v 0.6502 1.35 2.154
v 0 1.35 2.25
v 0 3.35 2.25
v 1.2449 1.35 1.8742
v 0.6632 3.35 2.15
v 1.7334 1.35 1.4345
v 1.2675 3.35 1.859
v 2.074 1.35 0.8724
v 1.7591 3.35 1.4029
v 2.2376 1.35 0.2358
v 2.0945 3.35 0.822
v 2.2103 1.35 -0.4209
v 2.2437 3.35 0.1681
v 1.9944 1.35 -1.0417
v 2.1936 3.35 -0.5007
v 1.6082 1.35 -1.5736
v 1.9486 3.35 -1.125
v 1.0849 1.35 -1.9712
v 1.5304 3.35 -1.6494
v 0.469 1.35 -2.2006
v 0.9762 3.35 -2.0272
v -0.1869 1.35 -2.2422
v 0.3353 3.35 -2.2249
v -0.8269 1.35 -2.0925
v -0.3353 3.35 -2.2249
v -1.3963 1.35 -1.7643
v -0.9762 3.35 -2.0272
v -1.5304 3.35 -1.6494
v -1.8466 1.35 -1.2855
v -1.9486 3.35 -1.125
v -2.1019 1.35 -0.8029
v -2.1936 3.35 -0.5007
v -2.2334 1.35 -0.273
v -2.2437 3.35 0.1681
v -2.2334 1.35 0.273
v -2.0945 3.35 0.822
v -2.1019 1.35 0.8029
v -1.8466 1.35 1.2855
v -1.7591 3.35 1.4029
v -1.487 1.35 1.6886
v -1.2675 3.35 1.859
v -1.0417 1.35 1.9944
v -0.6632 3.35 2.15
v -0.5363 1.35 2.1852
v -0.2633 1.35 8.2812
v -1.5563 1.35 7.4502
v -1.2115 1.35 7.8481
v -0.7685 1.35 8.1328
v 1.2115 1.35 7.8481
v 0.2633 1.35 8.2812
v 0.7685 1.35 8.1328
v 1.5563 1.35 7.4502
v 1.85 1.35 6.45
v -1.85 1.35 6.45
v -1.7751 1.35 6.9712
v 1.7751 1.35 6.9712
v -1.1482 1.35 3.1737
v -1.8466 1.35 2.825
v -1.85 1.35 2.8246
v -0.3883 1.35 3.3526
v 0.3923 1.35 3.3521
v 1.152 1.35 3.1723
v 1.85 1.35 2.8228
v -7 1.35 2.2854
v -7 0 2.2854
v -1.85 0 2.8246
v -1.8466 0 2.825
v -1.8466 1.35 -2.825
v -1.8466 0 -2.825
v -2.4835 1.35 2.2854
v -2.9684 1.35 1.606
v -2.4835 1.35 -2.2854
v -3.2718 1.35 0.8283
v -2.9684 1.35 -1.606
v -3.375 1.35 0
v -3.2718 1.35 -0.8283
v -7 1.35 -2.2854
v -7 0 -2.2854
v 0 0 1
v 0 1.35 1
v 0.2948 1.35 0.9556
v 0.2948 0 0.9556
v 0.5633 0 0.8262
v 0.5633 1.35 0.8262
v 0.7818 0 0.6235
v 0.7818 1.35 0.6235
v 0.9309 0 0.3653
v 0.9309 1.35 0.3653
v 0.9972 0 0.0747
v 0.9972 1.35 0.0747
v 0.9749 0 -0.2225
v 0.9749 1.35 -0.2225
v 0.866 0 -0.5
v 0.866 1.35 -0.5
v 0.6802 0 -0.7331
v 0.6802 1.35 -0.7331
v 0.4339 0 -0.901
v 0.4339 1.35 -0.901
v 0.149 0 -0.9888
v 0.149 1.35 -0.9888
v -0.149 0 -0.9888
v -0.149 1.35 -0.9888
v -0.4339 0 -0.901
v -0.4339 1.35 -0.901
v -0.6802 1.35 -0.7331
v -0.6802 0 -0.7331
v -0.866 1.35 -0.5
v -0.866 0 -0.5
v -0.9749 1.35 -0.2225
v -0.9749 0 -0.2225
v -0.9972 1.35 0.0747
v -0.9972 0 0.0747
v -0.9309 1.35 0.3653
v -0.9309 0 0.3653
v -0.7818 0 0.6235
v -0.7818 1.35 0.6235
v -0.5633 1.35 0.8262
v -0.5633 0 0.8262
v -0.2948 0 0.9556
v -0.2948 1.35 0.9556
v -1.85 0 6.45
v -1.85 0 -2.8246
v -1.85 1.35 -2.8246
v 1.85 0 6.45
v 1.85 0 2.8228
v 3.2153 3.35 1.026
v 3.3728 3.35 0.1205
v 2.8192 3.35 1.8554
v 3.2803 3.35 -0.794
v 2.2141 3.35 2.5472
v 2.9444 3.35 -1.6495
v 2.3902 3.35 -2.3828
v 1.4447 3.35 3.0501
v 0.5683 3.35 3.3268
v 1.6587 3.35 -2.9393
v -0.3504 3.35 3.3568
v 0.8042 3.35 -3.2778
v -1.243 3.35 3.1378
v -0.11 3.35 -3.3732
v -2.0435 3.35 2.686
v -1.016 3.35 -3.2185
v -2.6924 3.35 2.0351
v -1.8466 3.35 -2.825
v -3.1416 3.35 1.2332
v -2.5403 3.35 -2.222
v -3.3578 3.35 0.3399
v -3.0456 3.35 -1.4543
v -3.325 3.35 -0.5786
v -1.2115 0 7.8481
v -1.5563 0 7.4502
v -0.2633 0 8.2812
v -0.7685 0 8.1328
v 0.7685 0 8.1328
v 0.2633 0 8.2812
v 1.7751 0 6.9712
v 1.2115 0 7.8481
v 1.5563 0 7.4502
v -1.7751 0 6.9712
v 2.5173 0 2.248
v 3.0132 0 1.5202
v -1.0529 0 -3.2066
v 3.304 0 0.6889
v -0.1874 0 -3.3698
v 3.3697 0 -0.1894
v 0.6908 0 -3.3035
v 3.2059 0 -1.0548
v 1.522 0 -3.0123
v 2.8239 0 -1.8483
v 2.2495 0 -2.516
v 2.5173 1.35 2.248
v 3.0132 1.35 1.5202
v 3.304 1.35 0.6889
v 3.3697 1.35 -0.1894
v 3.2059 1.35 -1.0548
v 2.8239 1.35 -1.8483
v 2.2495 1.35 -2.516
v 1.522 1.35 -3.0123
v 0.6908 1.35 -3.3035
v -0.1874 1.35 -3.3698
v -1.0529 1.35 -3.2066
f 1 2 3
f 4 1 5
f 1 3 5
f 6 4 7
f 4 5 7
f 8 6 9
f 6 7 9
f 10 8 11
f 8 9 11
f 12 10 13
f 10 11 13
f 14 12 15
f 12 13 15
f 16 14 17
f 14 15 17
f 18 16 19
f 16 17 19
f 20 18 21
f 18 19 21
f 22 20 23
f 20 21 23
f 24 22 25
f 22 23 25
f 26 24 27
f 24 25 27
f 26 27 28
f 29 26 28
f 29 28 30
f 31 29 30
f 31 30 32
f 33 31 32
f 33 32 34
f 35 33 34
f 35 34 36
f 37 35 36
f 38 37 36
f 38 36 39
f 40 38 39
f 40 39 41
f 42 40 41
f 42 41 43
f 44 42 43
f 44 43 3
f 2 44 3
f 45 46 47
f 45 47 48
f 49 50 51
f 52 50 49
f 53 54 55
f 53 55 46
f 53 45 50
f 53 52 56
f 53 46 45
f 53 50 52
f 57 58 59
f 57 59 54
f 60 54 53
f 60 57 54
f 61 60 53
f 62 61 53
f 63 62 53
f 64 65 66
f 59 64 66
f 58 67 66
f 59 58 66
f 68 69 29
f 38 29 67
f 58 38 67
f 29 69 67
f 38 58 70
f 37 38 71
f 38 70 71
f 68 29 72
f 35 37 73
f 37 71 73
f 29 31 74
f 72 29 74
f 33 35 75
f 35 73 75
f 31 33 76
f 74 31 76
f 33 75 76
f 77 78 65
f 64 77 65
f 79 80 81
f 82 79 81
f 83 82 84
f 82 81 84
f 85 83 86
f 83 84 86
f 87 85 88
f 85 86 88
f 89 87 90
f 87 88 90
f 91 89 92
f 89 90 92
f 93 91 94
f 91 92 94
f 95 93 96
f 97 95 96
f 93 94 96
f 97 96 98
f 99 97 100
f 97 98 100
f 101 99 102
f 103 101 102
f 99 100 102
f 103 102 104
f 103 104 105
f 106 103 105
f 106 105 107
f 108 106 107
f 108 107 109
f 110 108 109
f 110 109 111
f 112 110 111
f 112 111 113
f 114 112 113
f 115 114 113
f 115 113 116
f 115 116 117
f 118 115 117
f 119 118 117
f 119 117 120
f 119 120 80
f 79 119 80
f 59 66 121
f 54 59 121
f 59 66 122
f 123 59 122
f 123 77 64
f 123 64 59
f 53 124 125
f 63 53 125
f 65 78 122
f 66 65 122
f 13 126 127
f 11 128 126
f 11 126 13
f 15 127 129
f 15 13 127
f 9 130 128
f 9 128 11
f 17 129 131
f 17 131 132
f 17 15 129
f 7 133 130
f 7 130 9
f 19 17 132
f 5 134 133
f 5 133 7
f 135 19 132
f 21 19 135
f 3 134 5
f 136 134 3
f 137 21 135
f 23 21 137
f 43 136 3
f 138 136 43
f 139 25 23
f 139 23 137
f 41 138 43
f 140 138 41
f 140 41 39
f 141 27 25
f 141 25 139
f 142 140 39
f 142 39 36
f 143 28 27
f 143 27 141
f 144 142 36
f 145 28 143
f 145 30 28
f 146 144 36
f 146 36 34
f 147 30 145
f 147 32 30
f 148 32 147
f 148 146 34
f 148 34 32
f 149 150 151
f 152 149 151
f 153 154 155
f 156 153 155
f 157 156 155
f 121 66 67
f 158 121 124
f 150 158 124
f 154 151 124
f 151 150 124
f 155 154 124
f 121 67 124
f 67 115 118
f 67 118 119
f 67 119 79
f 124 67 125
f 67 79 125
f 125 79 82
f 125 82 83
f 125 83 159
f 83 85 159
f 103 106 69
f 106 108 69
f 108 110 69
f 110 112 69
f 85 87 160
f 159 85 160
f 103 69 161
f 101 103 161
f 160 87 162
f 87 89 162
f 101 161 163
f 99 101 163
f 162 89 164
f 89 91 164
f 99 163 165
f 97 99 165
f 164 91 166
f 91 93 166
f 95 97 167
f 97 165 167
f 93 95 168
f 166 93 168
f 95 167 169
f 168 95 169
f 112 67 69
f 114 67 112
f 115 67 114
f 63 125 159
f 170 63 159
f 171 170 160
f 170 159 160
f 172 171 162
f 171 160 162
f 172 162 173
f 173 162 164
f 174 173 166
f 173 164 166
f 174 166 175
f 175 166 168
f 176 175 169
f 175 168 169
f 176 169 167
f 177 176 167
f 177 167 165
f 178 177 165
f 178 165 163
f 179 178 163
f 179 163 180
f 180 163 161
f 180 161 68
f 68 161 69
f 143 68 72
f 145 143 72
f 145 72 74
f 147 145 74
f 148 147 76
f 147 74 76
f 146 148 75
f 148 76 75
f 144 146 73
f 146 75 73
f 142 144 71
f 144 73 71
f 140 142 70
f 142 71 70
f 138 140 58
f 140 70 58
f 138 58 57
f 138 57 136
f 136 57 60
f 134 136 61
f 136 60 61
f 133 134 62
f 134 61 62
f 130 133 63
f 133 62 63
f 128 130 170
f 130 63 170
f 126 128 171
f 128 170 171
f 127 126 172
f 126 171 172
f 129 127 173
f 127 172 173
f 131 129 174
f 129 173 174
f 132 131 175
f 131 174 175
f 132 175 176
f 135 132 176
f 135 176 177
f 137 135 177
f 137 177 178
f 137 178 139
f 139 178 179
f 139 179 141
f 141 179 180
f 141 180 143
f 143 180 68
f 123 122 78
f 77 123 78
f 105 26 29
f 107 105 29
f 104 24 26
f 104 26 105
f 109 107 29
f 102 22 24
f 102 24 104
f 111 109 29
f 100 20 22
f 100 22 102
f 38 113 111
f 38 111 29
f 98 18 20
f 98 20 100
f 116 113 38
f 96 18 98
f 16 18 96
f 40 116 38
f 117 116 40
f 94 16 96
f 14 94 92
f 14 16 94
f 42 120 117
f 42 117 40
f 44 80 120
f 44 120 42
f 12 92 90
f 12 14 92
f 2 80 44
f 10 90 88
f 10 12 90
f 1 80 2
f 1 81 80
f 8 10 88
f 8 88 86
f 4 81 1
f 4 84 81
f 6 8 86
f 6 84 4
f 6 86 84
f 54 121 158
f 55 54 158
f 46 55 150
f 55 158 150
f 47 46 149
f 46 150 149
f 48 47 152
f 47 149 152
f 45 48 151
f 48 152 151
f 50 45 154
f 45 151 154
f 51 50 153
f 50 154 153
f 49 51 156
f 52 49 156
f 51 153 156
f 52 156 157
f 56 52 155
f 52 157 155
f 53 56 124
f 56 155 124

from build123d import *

# Parameters (mm, degrees)
ESTRUSIONE_ESTRUSIONE1_DEPTH   = 1.35
ESTRUSIONE_ESTRUSIONE1_2_DEPTH = 1.35
SCHIZZO2_R                     = 3.375
ESTRUSIONE_ESTRUSIONE2_DEPTH   = 2
SCHIZZO4_R                     = 2.25
TAGLIO_ESTRUSIONE1_DEPTH       = 2
SCHIZZO5_R                     = 1
TAGLIO_ESTRUSIONE2_DEPTH       = 12.040380428


with BuildPart() as part:
    # Schizzo1 → Estrusione-Estrusione1 (new body)
    with BuildSketch(Plane(origin=(0, 0, 0), x_dir=(1, 0, 0), z_dir=(0, 1, 0))):
        Polygon((-1.85, 2.824645909), (-7, 2.285363187), (-7, -2.285363187), (-1.85, -2.824645909), align=None)
    extrude(amount=ESTRUSIONE_ESTRUSIONE1_DEPTH)


with BuildPart() as body_2:
    # Schizzo1 → Estrusione-Estrusione1 2 (new body)
    with BuildSketch(Plane(origin=(0, 0, 0), x_dir=(1, 0, 0), z_dir=(0, 1, 0))):
        with BuildLine():
            Line((-1.846618531, 2.825), (-1.846618531, -2.825))
            Line((-1.846618531, -2.825), (-1.85, -2.824645909))
            Line((-1.85, -2.824645909), (-1.85, -6.45))
            ThreePointArc((-1.85, -6.45), (0, -8.3), (1.85, -6.45))
            Line((1.85, -6.45), (1.85, -2.822786744))
            ThreePointArc((1.85, -2.822786744), (2.823893878, 1.848309597), (-1.846618531, 2.825))
        make_face()
    extrude(amount=ESTRUSIONE_ESTRUSIONE1_2_DEPTH)

    # Schizzo2 → Estrusione-Estrusione2 (add)
    with BuildSketch(Plane(origin=(0, 1.35, 0), x_dir=(1, 0, 0), z_dir=(0, 1, 0))):
        with Locations(Location((0, 0, 0), (0, 0, 123.171451951))):
            Circle(SCHIZZO2_R)
    extrude(amount=ESTRUSIONE_ESTRUSIONE2_DEPTH)

    # Schizzo4 → Taglio-Estrusione1 (cut)
    with BuildSketch(Plane(origin=(0, 3.35, 0), x_dir=(1, 0, 0), z_dir=(0, 1, 0))):
        with Locations(Location((0, 0, 0), (0, 0, 270))):
            Circle(SCHIZZO4_R)
    extrude(amount=-TAGLIO_ESTRUSIONE1_DEPTH, mode=Mode.SUBTRACT)

    # Schizzo5 → Taglio-Estrusione2 (cut, through all)
    with BuildSketch(Plane(origin=(0, 1.35, 0), x_dir=(1, 0, 0), z_dir=(0, 1, 0))):
        with Locations(Location((0, 0, 0), (0, 0, 270))):
            Circle(SCHIZZO5_R)
    extrude(amount=-TAGLIO_ESTRUSIONE2_DEPTH, mode=Mode.SUBTRACT)


solid = Compound([part.part, body_2.part])
